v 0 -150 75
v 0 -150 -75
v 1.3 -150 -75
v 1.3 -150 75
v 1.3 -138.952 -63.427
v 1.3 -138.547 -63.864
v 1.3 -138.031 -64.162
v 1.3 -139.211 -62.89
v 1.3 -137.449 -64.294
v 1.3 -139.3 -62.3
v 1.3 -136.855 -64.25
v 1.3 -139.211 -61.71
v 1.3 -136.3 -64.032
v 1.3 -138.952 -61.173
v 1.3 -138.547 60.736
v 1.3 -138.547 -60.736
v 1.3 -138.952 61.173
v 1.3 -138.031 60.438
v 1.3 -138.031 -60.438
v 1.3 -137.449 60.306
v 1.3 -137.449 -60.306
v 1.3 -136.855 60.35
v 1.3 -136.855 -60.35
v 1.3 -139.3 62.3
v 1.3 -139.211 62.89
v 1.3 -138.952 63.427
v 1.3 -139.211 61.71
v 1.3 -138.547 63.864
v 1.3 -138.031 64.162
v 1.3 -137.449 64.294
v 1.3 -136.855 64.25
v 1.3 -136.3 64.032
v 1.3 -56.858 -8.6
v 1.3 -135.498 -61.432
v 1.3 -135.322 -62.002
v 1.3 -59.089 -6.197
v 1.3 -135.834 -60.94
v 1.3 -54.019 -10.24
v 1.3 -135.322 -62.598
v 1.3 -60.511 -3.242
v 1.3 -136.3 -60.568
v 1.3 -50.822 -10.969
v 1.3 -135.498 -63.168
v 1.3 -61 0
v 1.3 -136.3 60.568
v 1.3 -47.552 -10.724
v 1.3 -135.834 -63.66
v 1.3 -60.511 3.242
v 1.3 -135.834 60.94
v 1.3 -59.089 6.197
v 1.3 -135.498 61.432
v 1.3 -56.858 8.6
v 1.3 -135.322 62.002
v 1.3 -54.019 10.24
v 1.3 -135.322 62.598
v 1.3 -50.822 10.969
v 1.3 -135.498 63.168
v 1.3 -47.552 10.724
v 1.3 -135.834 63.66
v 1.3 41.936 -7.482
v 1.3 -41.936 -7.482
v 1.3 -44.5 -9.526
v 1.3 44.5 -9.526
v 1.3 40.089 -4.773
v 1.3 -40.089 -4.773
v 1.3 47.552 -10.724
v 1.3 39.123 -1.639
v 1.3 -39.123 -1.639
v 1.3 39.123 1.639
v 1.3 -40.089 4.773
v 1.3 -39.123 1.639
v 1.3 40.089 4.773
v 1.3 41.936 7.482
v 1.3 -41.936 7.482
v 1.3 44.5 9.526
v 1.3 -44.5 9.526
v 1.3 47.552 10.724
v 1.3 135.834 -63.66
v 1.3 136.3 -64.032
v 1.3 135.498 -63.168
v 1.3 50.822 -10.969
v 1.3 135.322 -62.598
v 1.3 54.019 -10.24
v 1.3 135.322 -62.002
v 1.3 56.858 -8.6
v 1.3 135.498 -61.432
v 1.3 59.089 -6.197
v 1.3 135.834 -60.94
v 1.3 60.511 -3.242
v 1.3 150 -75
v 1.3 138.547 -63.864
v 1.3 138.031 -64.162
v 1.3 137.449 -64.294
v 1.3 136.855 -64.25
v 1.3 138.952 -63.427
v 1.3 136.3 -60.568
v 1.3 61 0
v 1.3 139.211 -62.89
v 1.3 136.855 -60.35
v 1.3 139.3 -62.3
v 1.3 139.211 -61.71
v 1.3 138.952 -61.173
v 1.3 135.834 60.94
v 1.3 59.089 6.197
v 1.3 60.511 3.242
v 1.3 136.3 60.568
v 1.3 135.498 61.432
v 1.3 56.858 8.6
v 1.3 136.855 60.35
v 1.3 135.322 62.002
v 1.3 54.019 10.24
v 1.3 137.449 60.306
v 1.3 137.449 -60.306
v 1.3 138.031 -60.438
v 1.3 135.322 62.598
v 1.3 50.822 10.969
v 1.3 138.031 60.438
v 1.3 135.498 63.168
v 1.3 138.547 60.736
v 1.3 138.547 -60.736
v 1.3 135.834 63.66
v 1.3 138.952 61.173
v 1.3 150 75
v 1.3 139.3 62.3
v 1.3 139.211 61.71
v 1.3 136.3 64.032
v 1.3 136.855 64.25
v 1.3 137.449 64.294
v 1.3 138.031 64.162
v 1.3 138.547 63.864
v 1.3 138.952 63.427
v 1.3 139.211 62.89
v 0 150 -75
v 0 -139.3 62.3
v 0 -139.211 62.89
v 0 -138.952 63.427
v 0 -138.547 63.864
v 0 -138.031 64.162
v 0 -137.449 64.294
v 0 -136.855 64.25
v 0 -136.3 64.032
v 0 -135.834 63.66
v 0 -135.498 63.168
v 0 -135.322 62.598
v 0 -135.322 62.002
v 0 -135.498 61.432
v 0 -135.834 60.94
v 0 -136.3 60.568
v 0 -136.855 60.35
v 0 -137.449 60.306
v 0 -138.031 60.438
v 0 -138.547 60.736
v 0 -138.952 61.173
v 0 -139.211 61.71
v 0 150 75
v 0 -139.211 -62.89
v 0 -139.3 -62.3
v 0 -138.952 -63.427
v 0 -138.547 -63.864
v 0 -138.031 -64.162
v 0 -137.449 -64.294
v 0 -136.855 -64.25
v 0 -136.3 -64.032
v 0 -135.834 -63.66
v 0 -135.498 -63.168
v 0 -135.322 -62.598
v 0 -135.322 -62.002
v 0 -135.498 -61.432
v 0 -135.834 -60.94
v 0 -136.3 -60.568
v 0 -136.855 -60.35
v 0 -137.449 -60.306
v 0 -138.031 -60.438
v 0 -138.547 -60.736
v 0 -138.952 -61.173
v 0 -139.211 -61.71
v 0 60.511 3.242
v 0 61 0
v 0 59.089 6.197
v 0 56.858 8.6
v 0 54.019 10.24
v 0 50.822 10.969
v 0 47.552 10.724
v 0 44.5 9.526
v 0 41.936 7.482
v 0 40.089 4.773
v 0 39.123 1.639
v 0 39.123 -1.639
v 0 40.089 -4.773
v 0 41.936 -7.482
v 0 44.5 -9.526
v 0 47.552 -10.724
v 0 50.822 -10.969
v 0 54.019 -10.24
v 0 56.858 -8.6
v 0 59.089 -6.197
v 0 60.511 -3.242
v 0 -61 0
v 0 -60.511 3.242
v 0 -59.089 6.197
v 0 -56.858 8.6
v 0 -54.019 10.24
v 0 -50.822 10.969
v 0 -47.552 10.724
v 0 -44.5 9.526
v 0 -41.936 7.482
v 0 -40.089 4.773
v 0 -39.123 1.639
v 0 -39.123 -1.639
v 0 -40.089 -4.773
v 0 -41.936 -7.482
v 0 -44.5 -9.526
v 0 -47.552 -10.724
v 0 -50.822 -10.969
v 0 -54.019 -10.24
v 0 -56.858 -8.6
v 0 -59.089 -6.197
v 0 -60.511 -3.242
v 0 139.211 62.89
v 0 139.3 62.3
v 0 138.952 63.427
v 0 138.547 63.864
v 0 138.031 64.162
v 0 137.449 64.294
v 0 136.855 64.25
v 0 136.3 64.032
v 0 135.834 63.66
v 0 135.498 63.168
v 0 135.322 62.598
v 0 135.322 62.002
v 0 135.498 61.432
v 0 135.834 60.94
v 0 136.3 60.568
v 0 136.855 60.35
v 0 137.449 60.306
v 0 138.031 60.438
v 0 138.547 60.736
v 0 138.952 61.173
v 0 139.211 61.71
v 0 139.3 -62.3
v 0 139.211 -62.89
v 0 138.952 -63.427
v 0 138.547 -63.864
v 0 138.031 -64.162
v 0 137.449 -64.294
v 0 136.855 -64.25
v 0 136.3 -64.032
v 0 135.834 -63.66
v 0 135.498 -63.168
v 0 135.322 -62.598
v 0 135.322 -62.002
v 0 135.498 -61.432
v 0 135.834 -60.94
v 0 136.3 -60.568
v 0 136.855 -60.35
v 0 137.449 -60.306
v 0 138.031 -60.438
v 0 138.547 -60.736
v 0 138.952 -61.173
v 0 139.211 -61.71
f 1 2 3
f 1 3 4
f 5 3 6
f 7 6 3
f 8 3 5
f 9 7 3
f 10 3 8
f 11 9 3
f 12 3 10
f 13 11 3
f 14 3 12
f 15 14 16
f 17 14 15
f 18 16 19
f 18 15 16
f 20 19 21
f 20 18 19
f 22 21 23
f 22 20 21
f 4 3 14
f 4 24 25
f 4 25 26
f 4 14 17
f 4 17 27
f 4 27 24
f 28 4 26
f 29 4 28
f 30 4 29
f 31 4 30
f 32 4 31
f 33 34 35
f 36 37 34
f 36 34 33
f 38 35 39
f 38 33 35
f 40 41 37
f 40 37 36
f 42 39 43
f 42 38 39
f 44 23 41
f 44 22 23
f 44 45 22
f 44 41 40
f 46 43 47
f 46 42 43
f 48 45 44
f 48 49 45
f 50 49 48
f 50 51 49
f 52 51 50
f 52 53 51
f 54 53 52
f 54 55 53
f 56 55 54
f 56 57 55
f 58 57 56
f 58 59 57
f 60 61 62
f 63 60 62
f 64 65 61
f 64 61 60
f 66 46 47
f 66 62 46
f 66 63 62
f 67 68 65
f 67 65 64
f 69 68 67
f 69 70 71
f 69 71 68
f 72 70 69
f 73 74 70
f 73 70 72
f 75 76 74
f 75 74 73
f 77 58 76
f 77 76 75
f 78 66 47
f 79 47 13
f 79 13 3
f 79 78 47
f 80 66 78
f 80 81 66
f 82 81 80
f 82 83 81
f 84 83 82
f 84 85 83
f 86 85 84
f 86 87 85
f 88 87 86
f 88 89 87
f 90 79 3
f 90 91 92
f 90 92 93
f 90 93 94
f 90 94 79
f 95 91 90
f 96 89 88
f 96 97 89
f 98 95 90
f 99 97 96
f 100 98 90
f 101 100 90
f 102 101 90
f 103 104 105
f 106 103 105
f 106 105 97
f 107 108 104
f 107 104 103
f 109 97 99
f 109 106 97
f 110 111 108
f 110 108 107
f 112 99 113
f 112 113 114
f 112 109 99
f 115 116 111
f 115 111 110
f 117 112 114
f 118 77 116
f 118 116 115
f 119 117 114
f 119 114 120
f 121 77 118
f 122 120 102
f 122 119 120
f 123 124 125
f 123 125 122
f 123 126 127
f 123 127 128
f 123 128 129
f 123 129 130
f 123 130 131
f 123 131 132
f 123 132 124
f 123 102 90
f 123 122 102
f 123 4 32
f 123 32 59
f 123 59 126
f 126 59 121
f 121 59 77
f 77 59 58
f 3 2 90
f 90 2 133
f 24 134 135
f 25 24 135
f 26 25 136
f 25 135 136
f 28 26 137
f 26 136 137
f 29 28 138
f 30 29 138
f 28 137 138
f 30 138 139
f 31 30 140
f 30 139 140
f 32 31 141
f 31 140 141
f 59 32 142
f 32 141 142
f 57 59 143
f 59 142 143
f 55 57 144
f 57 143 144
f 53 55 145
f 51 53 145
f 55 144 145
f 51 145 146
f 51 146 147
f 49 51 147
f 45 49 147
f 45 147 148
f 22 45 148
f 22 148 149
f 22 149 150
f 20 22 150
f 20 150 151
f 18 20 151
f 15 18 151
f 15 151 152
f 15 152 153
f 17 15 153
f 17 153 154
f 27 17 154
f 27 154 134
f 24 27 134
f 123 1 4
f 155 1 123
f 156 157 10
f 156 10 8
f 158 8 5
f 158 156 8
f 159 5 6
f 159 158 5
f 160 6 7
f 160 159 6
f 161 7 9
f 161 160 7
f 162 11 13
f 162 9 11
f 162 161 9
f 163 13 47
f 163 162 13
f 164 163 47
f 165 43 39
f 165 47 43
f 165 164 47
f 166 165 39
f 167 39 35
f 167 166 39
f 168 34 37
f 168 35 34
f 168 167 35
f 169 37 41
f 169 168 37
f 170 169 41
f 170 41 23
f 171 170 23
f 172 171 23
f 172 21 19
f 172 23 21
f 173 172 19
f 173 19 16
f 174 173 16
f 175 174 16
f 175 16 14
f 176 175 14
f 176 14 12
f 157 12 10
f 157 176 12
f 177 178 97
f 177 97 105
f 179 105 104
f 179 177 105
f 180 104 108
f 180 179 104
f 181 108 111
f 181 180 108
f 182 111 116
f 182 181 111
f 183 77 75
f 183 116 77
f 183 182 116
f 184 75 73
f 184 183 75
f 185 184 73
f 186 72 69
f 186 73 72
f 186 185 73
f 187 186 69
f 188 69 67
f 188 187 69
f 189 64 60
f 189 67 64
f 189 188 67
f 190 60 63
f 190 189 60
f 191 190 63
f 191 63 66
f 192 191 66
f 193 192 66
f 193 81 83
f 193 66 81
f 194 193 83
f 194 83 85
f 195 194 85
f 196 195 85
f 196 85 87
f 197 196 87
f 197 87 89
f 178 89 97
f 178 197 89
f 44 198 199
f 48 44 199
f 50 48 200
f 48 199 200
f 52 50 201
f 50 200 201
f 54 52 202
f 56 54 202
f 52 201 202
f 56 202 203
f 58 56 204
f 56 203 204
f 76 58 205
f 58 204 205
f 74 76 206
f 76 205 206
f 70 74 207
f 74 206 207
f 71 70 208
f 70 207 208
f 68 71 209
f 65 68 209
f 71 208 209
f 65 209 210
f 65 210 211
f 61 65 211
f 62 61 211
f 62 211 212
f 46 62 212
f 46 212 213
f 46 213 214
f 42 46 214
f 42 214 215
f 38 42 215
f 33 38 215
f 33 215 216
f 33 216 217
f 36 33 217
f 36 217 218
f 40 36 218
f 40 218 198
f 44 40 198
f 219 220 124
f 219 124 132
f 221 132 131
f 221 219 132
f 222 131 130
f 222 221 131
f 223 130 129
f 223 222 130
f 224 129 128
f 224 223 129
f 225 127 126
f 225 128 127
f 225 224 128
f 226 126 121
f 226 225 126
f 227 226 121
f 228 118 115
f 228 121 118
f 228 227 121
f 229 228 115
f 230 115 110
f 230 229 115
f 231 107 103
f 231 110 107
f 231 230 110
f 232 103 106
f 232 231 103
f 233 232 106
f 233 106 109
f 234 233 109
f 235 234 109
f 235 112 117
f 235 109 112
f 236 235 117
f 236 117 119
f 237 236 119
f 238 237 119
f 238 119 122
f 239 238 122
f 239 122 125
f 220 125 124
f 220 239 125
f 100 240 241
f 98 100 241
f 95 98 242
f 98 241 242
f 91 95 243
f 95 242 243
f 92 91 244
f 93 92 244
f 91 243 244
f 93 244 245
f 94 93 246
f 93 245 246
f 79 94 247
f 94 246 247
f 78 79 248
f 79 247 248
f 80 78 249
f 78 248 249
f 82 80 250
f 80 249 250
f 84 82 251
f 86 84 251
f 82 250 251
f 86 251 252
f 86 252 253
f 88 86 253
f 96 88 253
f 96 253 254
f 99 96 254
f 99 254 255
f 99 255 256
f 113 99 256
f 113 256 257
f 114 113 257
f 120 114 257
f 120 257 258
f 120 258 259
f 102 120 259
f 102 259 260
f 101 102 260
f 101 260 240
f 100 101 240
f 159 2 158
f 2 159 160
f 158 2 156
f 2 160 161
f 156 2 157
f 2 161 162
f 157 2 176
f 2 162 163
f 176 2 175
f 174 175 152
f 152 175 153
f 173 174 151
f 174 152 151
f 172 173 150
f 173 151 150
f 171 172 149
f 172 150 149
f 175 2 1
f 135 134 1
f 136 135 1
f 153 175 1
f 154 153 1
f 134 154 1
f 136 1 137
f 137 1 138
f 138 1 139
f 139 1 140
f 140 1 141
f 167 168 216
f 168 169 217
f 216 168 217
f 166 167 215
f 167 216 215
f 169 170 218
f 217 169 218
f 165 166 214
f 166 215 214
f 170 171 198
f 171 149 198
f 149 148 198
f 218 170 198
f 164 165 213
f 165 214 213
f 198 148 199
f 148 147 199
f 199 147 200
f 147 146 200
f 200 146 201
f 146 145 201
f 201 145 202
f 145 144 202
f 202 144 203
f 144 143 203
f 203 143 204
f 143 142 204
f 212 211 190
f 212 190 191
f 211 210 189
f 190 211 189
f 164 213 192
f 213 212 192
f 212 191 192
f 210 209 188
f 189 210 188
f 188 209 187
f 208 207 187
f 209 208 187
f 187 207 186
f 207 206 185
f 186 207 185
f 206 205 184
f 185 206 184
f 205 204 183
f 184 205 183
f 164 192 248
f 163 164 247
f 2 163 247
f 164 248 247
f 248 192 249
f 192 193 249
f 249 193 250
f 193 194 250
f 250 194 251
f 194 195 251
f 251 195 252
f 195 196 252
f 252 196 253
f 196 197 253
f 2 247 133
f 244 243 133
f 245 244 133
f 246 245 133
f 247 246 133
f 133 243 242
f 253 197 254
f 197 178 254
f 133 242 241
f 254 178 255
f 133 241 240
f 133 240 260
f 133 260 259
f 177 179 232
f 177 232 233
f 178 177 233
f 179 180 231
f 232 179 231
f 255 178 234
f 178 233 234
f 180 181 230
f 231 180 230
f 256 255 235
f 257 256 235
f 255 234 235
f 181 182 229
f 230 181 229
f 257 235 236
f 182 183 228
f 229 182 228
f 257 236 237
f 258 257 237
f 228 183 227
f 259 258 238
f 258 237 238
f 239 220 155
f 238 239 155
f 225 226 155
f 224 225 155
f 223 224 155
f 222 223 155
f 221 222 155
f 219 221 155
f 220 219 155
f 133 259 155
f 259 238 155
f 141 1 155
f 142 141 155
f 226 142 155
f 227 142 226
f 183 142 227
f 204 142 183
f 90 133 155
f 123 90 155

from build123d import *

# Parameters (mm, degrees)
SKETCH1_W                            = 300
SKETCH1_H                            = 150
BOSS_EXTRUDE1_DEPTH                  = 1.3
F_4_0_4_DIAMETER_HOLE1_D             = 4
MIRROR1_AT_THE_SECOND_PLANE_COPY_1_D = 4
F_22_0_22_DIAMETER_HOLE1_D           = 22


with BuildPart() as part:
    # Sketch1 → Boss-Extrude1 (new body)
    with BuildSketch(Plane.YZ):
        Rectangle(SKETCH1_W, SKETCH1_H)
    extrude(amount=BOSS_EXTRUDE1_DEPTH)

    # Ø4.0 (4) Diameter Hole1 (through all)
    with Locations(Plane.YZ.offset(1.3)):
        with Locations((-137.3, 62.3)):
            f_4_0_4_diameter_hole1 = Hole(F_4_0_4_DIAMETER_HOLE1_D / 2)

    # Mirror1: Ø4.0 (4) Diameter Hole1 across plane
    add(f_4_0_4_diameter_hole1.mirror(Plane.ZX), mode=Mode.SUBTRACT)

    # Mirror1 at the second plane: Ø4.0 (4) Diameter Hole1 across plane
    add(f_4_0_4_diameter_hole1.mirror(Plane.XY), mode=Mode.SUBTRACT)

    # Mirror1 at the second plane copy 1 (through all)
    with Locations(Plane(origin=(1.3, 0, 0), x_dir=(0, -1, 0), z_dir=(1, 0, 0))):
        with Locations((-137.3, 62.3)):
            Hole(MIRROR1_AT_THE_SECOND_PLANE_COPY_1_D / 2)

    # Ø22.0 (22) Diameter Hole1 (through all)
    with Locations(Plane.YZ.offset(1.3)):
        with Locations((-50, 0)):
            f_22_0_22_diameter_hole1 = Hole(F_22_0_22_DIAMETER_HOLE1_D / 2)

    # Mirror2: Ø22.0 (22) Diameter Hole1 across plane
    add(f_22_0_22_diameter_hole1.mirror(Plane.ZX), mode=Mode.SUBTRACT)


solid = part.part
